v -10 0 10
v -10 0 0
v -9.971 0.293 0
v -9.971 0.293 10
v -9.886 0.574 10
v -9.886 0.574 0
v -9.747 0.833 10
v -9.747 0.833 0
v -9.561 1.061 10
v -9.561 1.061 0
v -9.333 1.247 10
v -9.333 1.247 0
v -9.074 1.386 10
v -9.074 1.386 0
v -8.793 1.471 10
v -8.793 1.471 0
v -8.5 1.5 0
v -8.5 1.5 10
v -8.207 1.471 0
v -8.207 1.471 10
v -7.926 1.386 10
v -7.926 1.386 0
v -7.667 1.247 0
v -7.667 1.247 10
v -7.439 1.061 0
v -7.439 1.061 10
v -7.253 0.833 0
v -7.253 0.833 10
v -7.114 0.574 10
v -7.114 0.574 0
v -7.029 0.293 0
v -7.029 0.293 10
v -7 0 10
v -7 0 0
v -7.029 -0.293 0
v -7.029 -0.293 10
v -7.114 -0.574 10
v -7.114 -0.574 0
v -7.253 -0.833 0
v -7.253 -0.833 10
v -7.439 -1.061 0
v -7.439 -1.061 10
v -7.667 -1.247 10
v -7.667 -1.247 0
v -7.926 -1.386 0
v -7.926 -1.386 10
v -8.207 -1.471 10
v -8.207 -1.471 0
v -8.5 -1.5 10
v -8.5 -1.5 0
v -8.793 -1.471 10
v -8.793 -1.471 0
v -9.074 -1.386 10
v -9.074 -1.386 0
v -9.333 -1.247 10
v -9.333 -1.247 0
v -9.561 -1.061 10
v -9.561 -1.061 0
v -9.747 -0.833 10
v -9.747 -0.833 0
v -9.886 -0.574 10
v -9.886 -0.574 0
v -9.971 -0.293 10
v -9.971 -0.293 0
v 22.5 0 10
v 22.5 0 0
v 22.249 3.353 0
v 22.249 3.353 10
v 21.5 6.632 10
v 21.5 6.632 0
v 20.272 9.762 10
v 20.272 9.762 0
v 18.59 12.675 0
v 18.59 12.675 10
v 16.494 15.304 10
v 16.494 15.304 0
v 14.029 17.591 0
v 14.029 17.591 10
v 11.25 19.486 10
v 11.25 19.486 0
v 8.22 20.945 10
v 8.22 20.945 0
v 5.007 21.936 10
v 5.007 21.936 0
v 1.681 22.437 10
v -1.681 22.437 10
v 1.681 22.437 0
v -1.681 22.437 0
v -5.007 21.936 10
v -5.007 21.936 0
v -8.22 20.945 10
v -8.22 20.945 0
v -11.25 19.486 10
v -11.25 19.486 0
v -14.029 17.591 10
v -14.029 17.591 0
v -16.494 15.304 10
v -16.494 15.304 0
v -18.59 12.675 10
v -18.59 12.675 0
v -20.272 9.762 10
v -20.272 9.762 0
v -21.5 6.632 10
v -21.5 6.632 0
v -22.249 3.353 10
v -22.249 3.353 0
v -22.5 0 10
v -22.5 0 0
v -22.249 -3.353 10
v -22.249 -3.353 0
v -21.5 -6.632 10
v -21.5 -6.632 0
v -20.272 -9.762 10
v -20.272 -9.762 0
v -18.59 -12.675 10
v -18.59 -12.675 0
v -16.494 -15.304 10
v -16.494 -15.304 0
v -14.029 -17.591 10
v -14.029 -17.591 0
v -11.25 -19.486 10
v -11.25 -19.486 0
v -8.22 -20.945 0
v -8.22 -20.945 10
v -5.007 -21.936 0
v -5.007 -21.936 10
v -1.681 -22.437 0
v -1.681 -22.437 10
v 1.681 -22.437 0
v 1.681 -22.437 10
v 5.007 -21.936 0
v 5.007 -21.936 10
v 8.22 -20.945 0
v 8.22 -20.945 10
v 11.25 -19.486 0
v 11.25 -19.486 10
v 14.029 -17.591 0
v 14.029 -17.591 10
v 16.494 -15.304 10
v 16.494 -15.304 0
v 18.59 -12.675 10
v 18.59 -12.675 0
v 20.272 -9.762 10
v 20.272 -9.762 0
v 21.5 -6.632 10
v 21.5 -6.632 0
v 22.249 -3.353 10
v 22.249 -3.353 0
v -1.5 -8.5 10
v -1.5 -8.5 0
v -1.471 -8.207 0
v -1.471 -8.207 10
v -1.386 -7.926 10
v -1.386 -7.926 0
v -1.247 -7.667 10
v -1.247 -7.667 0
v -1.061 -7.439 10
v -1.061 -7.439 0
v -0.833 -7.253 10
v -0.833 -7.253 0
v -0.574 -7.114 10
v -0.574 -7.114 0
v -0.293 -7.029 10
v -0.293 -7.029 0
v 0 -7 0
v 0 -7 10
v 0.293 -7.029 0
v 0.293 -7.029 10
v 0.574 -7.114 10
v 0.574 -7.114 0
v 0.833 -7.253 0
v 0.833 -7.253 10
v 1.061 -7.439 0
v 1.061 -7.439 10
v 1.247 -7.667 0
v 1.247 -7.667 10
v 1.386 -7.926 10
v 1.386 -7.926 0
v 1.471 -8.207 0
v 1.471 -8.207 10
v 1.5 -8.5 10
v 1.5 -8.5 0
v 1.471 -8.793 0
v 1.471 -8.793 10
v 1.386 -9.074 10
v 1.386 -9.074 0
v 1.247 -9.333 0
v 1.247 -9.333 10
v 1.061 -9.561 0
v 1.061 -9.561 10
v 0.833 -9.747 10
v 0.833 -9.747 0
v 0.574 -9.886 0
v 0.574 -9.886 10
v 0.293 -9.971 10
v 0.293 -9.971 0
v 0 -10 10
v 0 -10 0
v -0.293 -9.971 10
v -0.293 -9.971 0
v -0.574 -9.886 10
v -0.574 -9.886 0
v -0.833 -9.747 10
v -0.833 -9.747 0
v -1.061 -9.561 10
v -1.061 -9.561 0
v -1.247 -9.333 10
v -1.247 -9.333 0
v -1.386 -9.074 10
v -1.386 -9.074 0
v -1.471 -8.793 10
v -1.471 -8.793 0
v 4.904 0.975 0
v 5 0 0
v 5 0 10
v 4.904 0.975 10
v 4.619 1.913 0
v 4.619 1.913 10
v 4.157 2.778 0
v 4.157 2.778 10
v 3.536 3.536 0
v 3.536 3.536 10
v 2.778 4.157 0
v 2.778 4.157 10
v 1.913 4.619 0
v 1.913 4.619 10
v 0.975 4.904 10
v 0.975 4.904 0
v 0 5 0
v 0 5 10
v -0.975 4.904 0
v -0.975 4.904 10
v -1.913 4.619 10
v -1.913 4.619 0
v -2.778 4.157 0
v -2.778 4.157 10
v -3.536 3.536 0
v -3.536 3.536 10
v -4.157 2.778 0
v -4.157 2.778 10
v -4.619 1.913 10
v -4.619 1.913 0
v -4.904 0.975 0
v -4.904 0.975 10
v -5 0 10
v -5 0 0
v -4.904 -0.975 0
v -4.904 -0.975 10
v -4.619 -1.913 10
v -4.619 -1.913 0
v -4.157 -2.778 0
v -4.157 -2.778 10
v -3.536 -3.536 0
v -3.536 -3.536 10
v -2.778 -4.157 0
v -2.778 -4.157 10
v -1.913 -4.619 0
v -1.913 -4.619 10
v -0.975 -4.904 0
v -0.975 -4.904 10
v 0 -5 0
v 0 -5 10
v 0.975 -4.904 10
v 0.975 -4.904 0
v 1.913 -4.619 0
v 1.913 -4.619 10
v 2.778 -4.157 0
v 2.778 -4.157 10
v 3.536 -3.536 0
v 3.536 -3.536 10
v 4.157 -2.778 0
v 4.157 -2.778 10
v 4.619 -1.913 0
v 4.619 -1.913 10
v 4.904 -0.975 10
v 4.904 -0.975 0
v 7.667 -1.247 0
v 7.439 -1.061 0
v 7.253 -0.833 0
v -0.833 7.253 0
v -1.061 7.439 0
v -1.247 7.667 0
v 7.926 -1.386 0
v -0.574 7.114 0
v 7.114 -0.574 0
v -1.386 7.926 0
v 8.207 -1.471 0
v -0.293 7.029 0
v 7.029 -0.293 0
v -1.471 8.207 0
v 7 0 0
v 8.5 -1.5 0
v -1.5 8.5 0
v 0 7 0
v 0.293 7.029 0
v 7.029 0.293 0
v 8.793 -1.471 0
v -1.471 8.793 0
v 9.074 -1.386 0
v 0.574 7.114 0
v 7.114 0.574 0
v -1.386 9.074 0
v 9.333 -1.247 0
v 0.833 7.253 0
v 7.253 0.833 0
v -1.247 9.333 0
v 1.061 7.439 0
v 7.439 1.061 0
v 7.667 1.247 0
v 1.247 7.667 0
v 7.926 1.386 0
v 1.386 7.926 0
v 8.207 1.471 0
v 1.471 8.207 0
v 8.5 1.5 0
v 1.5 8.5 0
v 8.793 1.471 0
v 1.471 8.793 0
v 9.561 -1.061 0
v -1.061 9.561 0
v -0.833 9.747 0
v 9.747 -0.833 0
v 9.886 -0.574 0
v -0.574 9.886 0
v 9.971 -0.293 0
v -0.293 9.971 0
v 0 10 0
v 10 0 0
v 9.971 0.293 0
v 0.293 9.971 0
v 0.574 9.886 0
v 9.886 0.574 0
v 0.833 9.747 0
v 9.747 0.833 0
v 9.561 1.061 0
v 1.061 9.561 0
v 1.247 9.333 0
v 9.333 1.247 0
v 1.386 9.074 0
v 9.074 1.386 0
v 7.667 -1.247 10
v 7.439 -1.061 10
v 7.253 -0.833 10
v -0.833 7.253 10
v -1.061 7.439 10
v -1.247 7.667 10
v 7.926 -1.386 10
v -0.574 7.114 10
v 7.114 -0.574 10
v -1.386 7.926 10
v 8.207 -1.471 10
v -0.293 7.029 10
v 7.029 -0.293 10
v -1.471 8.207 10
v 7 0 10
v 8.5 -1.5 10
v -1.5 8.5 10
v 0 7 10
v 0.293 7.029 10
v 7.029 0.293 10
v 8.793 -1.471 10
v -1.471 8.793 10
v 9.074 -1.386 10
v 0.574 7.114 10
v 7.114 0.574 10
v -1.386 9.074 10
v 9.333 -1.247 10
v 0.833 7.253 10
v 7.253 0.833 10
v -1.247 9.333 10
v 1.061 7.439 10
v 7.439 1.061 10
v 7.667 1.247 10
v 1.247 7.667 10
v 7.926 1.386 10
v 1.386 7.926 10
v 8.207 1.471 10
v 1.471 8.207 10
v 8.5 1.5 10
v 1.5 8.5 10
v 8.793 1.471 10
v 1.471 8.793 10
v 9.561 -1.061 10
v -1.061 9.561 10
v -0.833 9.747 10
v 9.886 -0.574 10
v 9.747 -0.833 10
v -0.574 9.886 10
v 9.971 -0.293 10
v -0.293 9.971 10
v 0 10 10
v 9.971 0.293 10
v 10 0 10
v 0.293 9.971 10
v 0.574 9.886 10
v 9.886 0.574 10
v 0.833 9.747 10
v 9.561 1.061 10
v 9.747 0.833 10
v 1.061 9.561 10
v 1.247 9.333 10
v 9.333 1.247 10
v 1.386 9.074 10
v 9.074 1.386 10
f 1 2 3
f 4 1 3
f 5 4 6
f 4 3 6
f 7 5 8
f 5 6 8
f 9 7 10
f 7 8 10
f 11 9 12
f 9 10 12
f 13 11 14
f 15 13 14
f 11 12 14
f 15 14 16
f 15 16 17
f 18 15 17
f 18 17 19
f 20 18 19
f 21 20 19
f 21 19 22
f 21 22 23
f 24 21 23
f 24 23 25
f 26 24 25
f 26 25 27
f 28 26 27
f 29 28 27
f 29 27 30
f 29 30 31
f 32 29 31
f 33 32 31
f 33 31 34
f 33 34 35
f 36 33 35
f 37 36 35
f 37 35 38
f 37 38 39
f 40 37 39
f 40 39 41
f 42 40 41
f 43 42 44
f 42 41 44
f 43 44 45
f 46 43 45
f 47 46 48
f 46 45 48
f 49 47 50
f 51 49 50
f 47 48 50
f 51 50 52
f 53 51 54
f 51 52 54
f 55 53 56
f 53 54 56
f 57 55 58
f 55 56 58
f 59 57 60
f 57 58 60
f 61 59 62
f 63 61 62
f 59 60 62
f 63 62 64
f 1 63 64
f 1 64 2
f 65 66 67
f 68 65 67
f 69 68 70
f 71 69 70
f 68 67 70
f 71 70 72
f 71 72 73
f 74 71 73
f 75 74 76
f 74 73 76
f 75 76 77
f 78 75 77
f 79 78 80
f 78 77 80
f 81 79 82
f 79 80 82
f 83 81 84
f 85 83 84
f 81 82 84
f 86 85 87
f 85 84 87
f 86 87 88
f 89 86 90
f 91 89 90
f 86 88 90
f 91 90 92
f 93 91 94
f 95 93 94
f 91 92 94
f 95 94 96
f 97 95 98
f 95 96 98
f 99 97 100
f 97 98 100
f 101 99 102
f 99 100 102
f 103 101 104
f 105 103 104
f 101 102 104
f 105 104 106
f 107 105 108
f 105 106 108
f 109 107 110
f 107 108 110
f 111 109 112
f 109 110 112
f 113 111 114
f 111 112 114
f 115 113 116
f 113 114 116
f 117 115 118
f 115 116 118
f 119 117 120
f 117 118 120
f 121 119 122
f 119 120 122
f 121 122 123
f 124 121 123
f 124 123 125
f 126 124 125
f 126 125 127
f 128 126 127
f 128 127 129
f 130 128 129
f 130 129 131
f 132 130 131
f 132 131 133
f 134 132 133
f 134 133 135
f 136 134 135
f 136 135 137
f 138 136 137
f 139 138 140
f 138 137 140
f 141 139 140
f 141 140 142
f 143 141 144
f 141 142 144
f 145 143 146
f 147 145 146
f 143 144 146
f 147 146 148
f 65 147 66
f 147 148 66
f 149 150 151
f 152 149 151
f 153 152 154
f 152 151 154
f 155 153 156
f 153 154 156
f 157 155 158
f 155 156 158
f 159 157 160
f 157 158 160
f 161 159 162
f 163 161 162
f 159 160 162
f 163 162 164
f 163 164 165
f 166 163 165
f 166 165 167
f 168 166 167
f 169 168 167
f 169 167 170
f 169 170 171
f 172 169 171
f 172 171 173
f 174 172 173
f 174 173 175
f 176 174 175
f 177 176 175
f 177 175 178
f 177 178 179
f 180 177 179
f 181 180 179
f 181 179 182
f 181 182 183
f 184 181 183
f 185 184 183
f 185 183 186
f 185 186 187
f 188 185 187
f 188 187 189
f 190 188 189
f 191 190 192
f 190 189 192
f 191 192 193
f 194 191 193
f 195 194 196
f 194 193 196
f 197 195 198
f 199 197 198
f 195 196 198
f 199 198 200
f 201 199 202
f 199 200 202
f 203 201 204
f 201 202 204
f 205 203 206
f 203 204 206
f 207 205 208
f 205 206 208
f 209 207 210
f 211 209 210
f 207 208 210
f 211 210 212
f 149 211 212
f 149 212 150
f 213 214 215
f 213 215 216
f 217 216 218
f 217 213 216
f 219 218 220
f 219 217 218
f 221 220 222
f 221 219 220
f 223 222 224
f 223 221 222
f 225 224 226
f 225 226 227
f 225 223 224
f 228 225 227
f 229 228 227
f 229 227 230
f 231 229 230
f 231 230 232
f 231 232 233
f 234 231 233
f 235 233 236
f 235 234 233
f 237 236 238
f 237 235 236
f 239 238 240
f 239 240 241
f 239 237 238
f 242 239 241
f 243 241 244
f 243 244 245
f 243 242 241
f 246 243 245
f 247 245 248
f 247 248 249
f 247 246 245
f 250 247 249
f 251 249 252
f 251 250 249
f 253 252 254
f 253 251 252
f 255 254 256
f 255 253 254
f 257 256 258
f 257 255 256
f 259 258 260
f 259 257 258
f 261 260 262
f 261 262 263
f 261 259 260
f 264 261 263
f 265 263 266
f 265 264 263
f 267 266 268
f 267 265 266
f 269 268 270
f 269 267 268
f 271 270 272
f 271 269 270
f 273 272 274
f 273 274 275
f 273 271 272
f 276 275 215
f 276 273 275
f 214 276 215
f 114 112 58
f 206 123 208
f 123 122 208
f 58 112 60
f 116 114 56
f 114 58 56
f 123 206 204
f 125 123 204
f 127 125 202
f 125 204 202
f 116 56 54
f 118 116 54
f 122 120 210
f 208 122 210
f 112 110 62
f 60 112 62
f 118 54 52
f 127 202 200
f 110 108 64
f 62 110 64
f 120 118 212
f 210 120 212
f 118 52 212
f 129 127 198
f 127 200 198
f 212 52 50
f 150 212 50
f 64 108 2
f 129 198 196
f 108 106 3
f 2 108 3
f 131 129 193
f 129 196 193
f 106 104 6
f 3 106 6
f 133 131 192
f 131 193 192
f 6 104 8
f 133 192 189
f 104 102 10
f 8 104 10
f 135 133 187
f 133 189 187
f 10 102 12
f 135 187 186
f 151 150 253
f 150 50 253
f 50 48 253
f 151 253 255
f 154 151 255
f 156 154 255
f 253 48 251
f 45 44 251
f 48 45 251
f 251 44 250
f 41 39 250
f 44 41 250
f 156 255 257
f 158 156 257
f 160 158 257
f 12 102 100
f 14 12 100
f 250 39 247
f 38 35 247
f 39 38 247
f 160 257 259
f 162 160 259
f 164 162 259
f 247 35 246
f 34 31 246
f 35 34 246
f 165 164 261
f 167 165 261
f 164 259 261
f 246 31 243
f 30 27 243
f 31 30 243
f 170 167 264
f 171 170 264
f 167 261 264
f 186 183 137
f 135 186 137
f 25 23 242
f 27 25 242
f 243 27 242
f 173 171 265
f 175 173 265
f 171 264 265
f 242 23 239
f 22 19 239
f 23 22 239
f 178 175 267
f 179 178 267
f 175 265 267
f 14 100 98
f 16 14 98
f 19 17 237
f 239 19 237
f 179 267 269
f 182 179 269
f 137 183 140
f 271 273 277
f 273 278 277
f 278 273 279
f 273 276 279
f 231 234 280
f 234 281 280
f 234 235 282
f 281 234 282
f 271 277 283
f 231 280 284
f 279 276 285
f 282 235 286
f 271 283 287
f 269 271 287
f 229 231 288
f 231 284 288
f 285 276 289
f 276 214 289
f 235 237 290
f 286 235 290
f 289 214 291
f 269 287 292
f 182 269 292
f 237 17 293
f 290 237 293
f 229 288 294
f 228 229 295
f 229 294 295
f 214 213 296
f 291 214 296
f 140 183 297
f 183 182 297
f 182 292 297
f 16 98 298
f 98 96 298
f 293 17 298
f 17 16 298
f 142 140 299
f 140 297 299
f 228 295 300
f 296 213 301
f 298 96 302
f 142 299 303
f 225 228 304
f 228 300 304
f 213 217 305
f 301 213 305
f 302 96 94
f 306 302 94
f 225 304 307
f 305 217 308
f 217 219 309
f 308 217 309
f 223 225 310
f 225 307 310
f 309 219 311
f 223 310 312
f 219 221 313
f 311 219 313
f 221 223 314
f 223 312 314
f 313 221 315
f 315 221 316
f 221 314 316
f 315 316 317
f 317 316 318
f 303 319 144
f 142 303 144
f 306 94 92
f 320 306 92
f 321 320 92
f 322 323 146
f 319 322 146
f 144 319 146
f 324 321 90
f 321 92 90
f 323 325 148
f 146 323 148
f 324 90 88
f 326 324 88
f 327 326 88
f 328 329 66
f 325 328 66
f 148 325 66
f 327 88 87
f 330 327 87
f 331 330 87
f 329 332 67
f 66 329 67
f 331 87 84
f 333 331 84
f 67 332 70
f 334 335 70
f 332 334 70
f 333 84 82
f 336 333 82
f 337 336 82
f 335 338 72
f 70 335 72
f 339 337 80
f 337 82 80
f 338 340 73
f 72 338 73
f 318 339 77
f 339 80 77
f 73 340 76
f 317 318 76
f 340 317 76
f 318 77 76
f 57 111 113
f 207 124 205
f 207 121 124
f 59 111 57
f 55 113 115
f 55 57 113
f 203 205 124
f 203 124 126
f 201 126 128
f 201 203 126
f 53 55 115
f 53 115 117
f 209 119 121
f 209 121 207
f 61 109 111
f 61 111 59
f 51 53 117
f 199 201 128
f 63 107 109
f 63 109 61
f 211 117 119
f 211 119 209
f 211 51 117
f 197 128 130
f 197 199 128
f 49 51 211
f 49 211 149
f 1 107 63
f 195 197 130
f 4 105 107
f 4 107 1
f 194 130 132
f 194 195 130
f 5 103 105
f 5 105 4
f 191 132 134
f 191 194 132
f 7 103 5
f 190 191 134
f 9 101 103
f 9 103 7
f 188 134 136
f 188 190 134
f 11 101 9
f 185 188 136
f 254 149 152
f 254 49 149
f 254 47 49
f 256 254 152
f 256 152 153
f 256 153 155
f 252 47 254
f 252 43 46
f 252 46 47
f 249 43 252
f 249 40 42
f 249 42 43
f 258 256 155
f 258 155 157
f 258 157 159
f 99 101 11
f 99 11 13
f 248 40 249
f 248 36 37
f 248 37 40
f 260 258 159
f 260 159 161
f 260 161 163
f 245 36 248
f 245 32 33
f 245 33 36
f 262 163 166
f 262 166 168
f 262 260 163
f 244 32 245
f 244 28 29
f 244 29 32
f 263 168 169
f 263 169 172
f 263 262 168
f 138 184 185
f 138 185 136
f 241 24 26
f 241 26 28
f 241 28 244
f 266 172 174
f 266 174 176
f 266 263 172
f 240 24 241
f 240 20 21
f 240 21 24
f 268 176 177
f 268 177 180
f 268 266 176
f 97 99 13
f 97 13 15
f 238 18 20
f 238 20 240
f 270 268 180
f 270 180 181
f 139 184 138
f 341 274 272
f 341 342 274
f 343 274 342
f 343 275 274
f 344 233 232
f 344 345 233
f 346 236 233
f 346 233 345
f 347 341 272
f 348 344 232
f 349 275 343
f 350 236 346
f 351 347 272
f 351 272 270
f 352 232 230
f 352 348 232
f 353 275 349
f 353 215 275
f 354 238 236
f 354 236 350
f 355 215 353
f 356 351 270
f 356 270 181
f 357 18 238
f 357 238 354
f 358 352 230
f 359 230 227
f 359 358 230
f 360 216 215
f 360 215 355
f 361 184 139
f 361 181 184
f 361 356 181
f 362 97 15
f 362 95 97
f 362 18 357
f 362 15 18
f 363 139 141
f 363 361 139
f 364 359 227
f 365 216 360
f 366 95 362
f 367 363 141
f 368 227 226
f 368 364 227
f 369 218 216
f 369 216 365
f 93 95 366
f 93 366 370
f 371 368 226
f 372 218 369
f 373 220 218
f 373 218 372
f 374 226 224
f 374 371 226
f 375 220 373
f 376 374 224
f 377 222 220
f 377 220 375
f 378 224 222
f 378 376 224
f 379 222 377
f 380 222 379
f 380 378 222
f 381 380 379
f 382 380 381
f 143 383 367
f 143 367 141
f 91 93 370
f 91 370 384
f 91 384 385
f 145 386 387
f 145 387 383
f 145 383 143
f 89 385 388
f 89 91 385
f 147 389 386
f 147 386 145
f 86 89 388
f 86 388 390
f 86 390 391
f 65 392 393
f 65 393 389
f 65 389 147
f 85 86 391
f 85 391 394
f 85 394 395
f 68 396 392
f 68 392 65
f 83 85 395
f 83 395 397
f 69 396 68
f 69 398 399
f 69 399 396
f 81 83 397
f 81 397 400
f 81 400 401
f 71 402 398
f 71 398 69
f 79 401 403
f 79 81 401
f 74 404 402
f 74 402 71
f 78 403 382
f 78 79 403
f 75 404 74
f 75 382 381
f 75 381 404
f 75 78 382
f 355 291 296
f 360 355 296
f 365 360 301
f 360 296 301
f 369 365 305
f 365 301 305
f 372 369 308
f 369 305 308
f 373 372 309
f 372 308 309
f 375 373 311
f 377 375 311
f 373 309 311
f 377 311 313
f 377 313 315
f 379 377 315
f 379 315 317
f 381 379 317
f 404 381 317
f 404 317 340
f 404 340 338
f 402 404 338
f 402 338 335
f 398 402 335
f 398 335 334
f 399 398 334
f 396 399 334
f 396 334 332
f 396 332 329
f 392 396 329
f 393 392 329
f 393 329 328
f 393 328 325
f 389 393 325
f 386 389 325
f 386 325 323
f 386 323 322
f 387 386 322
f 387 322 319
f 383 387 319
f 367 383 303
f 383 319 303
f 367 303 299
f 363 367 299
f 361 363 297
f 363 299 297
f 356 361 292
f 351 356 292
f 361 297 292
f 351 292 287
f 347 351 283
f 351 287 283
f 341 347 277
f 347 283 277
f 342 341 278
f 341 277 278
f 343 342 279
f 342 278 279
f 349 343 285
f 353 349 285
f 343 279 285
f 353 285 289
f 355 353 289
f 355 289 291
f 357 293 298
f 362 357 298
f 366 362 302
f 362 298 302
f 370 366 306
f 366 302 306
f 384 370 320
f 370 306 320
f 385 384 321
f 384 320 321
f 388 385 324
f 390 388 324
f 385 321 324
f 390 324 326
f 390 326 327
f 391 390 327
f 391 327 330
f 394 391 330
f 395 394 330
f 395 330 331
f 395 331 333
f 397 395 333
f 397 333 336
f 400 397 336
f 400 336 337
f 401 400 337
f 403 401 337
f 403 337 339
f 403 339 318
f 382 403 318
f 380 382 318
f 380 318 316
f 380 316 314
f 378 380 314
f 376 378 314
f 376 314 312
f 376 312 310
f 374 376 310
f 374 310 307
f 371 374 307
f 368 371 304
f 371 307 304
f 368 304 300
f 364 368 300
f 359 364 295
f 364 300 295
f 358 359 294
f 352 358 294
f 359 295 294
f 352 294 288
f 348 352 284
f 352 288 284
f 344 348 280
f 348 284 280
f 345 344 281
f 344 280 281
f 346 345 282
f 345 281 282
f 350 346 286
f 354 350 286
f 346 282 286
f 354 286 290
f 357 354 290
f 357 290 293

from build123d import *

# Parameters (mm, degrees)
ESQUISSE1_R        = 22.5
ESQUISSE1_R_2      = 5
BOSS_EXTRU_1_DEPTH = 10
D_GAGEMENT_M21_D   = 3


with BuildPart() as part:
    # Esquisse1 → Boss.-Extru.1 (new body)
    with BuildSketch(Plane.XY):
        Circle(ESQUISSE1_R)
        Circle(ESQUISSE1_R_2, mode=Mode.SUBTRACT)
    extrude(amount=BOSS_EXTRU_1_DEPTH)

    # Dégagement M21 (through all)
    with Locations(Plane.XY.offset(10)):
        with Locations((0, 8.5), (8.5, 0), (0, -8.5), (-8.5, 0), (0, 0)):
            Hole(D_GAGEMENT_M21_D / 2)


solid = part.part
